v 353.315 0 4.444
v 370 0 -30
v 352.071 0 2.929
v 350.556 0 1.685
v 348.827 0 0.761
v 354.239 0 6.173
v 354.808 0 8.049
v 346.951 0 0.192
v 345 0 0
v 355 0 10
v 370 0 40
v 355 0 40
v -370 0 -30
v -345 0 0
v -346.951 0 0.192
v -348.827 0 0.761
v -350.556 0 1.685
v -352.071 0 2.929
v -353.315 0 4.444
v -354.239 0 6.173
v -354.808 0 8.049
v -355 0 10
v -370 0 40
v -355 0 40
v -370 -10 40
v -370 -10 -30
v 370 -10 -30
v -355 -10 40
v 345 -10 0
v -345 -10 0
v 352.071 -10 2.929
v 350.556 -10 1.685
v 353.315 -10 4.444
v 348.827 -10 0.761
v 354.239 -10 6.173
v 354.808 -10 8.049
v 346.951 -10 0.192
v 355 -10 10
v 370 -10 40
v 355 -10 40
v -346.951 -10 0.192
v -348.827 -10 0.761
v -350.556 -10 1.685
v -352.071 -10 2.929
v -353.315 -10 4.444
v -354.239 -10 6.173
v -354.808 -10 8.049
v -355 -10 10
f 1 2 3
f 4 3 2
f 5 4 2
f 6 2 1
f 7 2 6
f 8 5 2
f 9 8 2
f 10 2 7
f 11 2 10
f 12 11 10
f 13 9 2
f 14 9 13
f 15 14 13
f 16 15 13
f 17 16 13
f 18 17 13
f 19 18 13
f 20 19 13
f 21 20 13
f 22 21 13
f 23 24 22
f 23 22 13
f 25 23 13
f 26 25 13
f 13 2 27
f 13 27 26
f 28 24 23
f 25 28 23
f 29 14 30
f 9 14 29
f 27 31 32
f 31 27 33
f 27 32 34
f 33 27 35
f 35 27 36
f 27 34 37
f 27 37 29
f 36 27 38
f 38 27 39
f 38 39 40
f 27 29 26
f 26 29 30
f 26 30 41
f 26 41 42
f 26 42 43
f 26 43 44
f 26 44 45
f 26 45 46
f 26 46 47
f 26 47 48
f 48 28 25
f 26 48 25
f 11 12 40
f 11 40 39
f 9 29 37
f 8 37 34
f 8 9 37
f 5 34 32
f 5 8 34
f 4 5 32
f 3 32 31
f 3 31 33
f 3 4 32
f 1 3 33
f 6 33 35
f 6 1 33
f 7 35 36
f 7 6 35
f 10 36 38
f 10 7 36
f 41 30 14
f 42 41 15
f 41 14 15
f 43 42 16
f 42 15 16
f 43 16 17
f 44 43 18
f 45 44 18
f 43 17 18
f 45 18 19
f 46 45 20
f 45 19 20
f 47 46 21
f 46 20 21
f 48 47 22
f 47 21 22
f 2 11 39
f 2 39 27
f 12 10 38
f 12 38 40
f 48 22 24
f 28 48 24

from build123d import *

# Parameters (mm, degrees)
F1_DEPTH = 10


with BuildPart() as f1:
    # F0 (on Front) → F1 (new body)
    with BuildSketch(Plane.XZ):
        with BuildLine():
            Line((0, -30), (0, 0))
            Line((0, 0), (-345, 0))
            ThreePointArc((-345, 0), (-352.071068, 2.928932), (-355, 10))
            Line((-355, 10), (-355, 40))
            Line((-355, 40), (-370, 40))
            Line((-370, 40), (-370, -30))
            Line((-370, -30), (0, -30))
        make_face()
    extrude(amount=F1_DEPTH)

    # F2: F1 across face


with BuildPart() as f1_1:
    add(f1.part)
    add(f1.part.mirror(Plane(origin=(0, -5, -15), x_dir=(0, 1, 0), z_dir=(1, 0, 0))))


solid = f1_1.part
